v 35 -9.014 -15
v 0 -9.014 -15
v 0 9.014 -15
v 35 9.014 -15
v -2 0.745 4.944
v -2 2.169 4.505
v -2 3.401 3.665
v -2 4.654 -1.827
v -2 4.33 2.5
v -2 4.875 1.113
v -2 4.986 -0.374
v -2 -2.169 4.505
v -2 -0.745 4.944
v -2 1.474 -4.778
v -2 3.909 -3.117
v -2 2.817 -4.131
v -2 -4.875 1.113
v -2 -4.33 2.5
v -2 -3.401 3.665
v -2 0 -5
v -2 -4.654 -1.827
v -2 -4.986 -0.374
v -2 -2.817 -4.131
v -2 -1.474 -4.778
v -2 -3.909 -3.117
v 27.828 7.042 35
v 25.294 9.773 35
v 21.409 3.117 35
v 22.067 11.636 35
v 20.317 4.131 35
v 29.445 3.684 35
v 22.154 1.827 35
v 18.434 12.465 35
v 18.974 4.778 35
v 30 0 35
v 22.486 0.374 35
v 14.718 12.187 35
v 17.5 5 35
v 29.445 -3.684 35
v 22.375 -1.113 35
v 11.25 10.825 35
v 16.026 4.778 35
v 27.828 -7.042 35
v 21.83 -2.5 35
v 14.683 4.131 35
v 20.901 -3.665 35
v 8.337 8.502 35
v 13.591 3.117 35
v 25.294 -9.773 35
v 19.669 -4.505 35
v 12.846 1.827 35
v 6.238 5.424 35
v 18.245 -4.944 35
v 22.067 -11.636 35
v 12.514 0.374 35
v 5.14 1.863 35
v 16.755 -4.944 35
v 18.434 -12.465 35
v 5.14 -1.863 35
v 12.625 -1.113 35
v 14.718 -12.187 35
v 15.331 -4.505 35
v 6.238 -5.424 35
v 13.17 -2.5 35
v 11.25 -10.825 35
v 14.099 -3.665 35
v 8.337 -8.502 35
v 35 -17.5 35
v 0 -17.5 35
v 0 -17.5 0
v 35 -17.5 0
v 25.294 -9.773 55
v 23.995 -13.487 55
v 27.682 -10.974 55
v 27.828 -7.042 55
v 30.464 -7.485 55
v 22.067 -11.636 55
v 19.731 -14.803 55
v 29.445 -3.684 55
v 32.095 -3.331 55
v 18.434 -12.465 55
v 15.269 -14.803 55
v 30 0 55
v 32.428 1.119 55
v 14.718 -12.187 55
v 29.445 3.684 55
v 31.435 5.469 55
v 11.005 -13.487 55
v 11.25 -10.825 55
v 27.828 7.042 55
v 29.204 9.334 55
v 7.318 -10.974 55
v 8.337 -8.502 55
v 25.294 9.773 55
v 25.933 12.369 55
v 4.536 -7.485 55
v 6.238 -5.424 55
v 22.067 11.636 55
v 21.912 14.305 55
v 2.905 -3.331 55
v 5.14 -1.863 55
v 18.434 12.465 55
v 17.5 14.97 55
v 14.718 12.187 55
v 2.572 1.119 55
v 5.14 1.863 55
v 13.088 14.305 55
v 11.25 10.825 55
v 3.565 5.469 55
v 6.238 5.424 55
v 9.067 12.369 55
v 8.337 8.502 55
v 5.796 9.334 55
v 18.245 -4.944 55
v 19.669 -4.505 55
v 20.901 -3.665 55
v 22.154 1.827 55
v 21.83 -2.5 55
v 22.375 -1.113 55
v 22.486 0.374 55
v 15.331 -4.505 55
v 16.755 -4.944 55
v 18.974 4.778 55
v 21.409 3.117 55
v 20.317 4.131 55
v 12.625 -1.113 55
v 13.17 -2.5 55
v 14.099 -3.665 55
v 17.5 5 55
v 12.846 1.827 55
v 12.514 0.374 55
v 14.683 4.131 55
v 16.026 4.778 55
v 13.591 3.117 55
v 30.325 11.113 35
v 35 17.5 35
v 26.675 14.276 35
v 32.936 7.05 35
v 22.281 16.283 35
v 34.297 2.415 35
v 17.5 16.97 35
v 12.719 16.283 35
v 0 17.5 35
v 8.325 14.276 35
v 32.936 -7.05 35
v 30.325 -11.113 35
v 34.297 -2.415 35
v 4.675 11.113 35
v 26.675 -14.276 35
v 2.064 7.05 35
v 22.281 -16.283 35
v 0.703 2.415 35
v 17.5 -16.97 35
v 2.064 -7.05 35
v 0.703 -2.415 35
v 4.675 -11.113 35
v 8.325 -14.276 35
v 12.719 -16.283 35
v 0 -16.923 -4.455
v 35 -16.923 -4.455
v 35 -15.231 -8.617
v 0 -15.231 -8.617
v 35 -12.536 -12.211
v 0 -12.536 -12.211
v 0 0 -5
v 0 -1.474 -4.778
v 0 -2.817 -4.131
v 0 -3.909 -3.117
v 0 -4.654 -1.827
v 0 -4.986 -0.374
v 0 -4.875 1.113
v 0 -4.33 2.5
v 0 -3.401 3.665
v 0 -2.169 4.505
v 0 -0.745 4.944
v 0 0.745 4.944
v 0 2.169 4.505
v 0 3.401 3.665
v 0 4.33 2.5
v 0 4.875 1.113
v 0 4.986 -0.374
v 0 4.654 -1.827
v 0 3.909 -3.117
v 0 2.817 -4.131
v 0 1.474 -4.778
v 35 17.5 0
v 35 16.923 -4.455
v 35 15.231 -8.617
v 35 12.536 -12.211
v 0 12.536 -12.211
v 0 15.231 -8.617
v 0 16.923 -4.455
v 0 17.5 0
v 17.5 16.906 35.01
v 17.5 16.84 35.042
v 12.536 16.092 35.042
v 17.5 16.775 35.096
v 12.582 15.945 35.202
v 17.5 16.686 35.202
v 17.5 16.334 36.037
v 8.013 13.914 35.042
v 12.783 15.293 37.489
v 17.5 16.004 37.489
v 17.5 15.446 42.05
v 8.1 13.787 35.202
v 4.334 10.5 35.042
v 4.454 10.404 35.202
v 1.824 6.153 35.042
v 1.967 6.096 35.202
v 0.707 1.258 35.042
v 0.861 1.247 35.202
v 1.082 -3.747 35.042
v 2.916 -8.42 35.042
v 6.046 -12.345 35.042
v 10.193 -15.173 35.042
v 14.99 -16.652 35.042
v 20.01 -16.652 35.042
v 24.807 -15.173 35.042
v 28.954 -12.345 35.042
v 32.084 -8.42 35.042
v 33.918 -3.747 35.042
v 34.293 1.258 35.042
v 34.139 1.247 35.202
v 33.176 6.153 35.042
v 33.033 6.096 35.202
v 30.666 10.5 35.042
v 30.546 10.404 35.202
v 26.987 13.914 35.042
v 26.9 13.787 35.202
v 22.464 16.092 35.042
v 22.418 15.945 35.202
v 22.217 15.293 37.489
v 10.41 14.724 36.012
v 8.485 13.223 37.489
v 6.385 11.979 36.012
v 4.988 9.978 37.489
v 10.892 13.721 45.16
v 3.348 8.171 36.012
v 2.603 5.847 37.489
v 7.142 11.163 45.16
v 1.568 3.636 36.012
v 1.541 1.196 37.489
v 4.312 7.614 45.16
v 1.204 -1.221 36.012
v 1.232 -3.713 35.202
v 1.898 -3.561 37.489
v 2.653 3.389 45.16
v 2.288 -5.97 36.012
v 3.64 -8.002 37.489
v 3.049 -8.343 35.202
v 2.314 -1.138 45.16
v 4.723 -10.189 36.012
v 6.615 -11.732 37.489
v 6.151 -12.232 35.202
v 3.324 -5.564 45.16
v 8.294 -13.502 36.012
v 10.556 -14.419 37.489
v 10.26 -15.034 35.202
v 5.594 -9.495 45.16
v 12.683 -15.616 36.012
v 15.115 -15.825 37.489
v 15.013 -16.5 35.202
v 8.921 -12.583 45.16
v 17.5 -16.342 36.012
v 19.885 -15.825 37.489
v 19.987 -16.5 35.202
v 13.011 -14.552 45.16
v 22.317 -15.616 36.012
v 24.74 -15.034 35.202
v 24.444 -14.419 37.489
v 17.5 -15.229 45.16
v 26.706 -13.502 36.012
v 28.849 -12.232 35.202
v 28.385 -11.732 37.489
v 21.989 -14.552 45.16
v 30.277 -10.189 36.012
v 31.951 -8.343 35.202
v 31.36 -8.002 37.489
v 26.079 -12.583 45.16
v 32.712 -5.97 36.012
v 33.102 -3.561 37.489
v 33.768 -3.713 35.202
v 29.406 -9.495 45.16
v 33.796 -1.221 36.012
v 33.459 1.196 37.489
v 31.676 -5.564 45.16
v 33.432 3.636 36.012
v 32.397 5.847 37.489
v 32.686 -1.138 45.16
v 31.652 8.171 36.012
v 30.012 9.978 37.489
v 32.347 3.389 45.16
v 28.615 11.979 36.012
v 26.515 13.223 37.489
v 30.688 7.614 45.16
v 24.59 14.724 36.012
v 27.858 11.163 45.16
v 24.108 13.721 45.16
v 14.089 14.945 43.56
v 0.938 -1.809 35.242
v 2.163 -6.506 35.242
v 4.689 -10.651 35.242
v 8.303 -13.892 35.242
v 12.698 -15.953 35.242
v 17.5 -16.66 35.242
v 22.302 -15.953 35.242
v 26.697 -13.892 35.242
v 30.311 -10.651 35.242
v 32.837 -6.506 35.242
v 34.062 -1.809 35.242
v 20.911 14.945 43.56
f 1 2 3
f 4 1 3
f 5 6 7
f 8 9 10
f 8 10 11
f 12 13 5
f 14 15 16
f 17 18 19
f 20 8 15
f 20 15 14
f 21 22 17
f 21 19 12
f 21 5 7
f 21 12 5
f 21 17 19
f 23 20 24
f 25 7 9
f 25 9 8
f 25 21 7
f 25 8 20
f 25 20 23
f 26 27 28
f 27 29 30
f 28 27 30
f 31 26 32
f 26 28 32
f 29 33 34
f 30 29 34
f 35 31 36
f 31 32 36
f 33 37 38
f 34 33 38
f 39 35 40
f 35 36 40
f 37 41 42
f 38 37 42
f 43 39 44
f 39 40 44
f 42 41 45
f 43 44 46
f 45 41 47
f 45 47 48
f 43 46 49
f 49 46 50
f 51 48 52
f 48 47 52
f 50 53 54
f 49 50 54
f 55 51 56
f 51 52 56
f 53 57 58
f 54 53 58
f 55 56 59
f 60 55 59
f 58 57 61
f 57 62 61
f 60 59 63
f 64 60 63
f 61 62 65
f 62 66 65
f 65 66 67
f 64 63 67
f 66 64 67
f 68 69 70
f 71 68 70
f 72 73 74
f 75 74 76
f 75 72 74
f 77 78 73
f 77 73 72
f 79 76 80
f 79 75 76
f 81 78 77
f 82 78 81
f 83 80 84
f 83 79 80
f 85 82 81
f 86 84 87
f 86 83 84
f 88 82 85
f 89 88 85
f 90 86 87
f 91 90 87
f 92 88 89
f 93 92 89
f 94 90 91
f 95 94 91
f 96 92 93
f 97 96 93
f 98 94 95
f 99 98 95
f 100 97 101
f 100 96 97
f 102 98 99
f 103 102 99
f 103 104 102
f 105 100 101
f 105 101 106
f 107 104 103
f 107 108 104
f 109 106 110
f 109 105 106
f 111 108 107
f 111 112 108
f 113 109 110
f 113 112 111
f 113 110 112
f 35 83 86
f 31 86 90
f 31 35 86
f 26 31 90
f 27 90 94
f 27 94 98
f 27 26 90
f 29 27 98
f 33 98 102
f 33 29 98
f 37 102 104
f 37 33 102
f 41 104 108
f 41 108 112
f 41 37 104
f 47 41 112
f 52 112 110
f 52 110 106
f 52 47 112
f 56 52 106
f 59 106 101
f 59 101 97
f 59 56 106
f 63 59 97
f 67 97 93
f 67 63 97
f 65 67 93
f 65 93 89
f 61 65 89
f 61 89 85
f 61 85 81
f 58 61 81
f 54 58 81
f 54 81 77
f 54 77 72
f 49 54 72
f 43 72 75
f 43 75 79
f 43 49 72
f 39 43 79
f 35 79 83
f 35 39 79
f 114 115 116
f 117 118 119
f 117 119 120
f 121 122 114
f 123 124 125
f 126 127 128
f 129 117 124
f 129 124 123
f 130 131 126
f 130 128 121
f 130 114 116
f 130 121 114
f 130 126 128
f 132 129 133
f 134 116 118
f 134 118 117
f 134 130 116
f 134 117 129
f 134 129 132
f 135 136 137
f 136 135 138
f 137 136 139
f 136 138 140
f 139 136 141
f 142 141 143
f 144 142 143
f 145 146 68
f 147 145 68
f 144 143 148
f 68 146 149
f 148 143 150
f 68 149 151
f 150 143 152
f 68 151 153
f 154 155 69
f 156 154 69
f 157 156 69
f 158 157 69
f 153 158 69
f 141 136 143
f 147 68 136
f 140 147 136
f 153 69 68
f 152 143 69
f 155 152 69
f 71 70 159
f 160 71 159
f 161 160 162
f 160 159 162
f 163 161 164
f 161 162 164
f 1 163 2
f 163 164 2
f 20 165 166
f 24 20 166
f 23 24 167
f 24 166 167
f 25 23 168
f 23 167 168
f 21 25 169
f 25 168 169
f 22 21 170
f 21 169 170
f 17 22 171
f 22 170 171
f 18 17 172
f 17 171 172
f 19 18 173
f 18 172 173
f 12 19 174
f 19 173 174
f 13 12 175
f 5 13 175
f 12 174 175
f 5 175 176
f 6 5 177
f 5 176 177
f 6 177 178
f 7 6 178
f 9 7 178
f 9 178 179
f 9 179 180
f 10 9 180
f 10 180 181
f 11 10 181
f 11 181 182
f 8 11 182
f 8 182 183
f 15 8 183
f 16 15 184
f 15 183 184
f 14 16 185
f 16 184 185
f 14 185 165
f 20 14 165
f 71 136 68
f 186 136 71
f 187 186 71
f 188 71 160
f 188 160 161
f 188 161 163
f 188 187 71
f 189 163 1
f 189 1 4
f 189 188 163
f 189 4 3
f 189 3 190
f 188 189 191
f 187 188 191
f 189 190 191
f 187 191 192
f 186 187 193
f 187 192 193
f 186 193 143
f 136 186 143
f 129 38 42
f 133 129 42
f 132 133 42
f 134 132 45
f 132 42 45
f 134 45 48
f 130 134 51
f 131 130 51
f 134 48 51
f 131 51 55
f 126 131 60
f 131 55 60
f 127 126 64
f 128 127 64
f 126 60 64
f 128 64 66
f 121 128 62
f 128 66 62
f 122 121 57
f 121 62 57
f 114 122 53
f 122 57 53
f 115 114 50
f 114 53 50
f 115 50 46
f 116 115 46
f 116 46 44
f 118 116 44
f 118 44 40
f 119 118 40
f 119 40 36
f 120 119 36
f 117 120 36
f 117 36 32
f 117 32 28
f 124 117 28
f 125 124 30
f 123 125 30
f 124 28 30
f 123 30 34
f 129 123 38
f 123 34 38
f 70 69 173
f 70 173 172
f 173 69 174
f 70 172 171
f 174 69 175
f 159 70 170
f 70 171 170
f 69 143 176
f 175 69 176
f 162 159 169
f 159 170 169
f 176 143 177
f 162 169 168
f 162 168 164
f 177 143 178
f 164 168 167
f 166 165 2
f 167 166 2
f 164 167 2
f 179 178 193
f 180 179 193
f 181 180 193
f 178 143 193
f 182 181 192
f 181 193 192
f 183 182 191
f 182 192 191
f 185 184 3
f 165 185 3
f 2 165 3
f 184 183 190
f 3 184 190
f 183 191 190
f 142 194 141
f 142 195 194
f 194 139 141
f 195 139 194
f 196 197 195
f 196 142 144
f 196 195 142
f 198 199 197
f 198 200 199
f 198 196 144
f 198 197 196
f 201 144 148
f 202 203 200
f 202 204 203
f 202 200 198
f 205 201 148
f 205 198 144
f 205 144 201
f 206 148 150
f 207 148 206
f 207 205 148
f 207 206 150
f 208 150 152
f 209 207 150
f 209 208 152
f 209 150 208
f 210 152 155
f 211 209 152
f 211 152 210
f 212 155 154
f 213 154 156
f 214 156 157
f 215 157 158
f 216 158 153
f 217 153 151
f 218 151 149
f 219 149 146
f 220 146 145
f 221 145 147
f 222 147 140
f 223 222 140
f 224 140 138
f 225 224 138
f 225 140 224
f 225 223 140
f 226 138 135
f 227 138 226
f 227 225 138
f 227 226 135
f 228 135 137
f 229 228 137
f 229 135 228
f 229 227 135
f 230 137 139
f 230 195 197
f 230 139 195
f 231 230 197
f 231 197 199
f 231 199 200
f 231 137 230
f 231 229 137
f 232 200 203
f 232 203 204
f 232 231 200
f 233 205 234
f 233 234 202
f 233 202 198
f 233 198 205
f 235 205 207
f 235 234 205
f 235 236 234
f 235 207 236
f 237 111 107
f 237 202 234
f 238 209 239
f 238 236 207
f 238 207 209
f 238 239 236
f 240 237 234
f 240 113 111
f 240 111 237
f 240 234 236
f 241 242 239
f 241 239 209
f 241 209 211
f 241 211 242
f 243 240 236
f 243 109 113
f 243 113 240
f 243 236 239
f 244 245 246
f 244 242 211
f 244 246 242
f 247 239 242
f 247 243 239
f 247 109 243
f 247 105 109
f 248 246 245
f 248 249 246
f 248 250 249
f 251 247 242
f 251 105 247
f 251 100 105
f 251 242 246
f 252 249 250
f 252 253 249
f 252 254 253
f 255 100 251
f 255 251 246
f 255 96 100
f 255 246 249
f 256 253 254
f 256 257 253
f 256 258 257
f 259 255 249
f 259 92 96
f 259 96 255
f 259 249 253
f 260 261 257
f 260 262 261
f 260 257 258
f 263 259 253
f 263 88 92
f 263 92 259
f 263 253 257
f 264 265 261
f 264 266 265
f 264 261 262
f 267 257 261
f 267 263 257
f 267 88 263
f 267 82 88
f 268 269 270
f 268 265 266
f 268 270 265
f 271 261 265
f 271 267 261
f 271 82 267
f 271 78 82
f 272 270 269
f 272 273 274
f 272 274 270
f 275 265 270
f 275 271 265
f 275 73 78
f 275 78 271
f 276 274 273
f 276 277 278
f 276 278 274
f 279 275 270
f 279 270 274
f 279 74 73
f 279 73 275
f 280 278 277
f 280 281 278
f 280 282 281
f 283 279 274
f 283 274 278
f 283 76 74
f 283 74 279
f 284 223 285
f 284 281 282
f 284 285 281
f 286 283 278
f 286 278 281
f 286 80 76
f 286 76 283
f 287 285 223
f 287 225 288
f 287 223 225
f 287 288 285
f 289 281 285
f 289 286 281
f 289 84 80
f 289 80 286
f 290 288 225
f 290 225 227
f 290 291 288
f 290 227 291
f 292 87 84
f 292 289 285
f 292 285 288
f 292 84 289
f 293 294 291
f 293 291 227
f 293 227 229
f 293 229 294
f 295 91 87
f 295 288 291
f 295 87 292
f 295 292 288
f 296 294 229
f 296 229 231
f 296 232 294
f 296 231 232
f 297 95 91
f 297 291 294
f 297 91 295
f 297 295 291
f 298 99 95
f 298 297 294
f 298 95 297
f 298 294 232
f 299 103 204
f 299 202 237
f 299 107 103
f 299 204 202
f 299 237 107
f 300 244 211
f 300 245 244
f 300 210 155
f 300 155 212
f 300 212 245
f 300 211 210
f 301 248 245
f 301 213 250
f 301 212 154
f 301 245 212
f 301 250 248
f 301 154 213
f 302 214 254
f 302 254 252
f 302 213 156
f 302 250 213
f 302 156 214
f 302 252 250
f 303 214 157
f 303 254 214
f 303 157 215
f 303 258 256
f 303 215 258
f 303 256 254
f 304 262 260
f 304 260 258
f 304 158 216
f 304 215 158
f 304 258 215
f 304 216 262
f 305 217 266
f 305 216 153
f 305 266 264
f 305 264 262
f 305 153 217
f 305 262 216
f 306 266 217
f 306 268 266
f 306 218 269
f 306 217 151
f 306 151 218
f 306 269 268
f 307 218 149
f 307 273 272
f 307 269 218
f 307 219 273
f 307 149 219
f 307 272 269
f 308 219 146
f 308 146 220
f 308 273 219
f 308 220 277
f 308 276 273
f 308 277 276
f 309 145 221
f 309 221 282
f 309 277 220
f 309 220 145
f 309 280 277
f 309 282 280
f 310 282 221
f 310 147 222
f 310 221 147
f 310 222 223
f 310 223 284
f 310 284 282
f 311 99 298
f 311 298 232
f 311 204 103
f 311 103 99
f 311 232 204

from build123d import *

# Parameters (mm, degrees)
AUFSATZ_LINEAR_AUSTRAGEN1_DEPTH = 35
SKIZZE3_R                       = 14.969948268
SKIZZE3_R_2                     = 12.5
SKIZZE3_R_3                     = 5
AUFSATZ_LINEAR_AUSTRAGEN2_DEPTH = 20
VERRUNDUNG1_SIZE                = 2
VERRUNDUNG1_SIZE_2              = 20
SKIZZE4_R                       = 5
AUFSATZ_LINEAR_AUSTRAGEN3_DEPTH = 2


with BuildPart() as part:
    # Skizze2 → Aufsatz-Linear austragen1 (new body)
    with BuildSketch(Plane(origin=(0, 0, 0), x_dir=(0, 0, -1), z_dir=(1, 0, 0))):
        with BuildLine():
            Line((-35, -17.5), (3.5e-08, -17.5))
            ThreePointArc((3.5e-08, -17.5), (8.617050894, -15.231429148), (15, -9.013878189))
            Line((15, -9.013878189), (15, 9.013878189))
            ThreePointArc((15, 9.013878189), (8.61705092, 15.231429133), (9.5e-08, 17.5))
            Line((9.5e-08, 17.5), (-35, 17.5))
            Line((-35, 17.5), (-35, -17.5))
        make_face()
    extrude(amount=AUFSATZ_LINEAR_AUSTRAGEN1_DEPTH)

    # Skizze3 → Aufsatz-Linear austragen2 (add)
    # profile 1 of 2: a face of its own
    with BuildSketch(Plane.XY.offset(35)):
        with Locations(Location((17.5, 0, 0), (0, 0, 90))):
            Circle(SKIZZE3_R)
        with Locations((17.5, 0)):
            Circle(SKIZZE3_R_2, mode=Mode.SUBTRACT)
    # profile 2 of 2: a face of its own
    with BuildSketch(Plane.XY.offset(35)):
        with Locations(Location((17.5, 0, 0), (0, 0, 90))):
            Circle(SKIZZE3_R_3)
    extrude(amount=AUFSATZ_LINEAR_AUSTRAGEN2_DEPTH)

    # Verrundung1
    # an asymmetric fillet: 20, 2 mm, written as the material it adds along each edge
    with BuildSketch(Plane(origin=(17.5, 0, 35), x_dir=(0, 1, 0), z_dir=(1, 0, 0))) as verrundung1_piece_1:
        with BuildLine():
            Bezier((14.969948268 + VERRUNDUNG1_SIZE, 0), (14.969948268, 0), (14.969948268, VERRUNDUNG1_SIZE_2), weights=[1, 0.707106781, 1])
            Line((14.969948268, VERRUNDUNG1_SIZE_2), (14.969948268, 0))
            Line((14.969948268, 0), (14.969948268 + VERRUNDUNG1_SIZE, 0))
        make_face()
    revolve(axis=Axis((17.5, 0, 35), (0, 0, 1)))

    # Skizze4 → Aufsatz-Linear austragen3 (add)
    with BuildSketch(Plane.ZY):
        with Locations(Location((0, 0, 0), (0, 0, 180))):
            Circle(SKIZZE4_R)
    extrude(amount=AUFSATZ_LINEAR_AUSTRAGEN3_DEPTH)


solid = part.part
